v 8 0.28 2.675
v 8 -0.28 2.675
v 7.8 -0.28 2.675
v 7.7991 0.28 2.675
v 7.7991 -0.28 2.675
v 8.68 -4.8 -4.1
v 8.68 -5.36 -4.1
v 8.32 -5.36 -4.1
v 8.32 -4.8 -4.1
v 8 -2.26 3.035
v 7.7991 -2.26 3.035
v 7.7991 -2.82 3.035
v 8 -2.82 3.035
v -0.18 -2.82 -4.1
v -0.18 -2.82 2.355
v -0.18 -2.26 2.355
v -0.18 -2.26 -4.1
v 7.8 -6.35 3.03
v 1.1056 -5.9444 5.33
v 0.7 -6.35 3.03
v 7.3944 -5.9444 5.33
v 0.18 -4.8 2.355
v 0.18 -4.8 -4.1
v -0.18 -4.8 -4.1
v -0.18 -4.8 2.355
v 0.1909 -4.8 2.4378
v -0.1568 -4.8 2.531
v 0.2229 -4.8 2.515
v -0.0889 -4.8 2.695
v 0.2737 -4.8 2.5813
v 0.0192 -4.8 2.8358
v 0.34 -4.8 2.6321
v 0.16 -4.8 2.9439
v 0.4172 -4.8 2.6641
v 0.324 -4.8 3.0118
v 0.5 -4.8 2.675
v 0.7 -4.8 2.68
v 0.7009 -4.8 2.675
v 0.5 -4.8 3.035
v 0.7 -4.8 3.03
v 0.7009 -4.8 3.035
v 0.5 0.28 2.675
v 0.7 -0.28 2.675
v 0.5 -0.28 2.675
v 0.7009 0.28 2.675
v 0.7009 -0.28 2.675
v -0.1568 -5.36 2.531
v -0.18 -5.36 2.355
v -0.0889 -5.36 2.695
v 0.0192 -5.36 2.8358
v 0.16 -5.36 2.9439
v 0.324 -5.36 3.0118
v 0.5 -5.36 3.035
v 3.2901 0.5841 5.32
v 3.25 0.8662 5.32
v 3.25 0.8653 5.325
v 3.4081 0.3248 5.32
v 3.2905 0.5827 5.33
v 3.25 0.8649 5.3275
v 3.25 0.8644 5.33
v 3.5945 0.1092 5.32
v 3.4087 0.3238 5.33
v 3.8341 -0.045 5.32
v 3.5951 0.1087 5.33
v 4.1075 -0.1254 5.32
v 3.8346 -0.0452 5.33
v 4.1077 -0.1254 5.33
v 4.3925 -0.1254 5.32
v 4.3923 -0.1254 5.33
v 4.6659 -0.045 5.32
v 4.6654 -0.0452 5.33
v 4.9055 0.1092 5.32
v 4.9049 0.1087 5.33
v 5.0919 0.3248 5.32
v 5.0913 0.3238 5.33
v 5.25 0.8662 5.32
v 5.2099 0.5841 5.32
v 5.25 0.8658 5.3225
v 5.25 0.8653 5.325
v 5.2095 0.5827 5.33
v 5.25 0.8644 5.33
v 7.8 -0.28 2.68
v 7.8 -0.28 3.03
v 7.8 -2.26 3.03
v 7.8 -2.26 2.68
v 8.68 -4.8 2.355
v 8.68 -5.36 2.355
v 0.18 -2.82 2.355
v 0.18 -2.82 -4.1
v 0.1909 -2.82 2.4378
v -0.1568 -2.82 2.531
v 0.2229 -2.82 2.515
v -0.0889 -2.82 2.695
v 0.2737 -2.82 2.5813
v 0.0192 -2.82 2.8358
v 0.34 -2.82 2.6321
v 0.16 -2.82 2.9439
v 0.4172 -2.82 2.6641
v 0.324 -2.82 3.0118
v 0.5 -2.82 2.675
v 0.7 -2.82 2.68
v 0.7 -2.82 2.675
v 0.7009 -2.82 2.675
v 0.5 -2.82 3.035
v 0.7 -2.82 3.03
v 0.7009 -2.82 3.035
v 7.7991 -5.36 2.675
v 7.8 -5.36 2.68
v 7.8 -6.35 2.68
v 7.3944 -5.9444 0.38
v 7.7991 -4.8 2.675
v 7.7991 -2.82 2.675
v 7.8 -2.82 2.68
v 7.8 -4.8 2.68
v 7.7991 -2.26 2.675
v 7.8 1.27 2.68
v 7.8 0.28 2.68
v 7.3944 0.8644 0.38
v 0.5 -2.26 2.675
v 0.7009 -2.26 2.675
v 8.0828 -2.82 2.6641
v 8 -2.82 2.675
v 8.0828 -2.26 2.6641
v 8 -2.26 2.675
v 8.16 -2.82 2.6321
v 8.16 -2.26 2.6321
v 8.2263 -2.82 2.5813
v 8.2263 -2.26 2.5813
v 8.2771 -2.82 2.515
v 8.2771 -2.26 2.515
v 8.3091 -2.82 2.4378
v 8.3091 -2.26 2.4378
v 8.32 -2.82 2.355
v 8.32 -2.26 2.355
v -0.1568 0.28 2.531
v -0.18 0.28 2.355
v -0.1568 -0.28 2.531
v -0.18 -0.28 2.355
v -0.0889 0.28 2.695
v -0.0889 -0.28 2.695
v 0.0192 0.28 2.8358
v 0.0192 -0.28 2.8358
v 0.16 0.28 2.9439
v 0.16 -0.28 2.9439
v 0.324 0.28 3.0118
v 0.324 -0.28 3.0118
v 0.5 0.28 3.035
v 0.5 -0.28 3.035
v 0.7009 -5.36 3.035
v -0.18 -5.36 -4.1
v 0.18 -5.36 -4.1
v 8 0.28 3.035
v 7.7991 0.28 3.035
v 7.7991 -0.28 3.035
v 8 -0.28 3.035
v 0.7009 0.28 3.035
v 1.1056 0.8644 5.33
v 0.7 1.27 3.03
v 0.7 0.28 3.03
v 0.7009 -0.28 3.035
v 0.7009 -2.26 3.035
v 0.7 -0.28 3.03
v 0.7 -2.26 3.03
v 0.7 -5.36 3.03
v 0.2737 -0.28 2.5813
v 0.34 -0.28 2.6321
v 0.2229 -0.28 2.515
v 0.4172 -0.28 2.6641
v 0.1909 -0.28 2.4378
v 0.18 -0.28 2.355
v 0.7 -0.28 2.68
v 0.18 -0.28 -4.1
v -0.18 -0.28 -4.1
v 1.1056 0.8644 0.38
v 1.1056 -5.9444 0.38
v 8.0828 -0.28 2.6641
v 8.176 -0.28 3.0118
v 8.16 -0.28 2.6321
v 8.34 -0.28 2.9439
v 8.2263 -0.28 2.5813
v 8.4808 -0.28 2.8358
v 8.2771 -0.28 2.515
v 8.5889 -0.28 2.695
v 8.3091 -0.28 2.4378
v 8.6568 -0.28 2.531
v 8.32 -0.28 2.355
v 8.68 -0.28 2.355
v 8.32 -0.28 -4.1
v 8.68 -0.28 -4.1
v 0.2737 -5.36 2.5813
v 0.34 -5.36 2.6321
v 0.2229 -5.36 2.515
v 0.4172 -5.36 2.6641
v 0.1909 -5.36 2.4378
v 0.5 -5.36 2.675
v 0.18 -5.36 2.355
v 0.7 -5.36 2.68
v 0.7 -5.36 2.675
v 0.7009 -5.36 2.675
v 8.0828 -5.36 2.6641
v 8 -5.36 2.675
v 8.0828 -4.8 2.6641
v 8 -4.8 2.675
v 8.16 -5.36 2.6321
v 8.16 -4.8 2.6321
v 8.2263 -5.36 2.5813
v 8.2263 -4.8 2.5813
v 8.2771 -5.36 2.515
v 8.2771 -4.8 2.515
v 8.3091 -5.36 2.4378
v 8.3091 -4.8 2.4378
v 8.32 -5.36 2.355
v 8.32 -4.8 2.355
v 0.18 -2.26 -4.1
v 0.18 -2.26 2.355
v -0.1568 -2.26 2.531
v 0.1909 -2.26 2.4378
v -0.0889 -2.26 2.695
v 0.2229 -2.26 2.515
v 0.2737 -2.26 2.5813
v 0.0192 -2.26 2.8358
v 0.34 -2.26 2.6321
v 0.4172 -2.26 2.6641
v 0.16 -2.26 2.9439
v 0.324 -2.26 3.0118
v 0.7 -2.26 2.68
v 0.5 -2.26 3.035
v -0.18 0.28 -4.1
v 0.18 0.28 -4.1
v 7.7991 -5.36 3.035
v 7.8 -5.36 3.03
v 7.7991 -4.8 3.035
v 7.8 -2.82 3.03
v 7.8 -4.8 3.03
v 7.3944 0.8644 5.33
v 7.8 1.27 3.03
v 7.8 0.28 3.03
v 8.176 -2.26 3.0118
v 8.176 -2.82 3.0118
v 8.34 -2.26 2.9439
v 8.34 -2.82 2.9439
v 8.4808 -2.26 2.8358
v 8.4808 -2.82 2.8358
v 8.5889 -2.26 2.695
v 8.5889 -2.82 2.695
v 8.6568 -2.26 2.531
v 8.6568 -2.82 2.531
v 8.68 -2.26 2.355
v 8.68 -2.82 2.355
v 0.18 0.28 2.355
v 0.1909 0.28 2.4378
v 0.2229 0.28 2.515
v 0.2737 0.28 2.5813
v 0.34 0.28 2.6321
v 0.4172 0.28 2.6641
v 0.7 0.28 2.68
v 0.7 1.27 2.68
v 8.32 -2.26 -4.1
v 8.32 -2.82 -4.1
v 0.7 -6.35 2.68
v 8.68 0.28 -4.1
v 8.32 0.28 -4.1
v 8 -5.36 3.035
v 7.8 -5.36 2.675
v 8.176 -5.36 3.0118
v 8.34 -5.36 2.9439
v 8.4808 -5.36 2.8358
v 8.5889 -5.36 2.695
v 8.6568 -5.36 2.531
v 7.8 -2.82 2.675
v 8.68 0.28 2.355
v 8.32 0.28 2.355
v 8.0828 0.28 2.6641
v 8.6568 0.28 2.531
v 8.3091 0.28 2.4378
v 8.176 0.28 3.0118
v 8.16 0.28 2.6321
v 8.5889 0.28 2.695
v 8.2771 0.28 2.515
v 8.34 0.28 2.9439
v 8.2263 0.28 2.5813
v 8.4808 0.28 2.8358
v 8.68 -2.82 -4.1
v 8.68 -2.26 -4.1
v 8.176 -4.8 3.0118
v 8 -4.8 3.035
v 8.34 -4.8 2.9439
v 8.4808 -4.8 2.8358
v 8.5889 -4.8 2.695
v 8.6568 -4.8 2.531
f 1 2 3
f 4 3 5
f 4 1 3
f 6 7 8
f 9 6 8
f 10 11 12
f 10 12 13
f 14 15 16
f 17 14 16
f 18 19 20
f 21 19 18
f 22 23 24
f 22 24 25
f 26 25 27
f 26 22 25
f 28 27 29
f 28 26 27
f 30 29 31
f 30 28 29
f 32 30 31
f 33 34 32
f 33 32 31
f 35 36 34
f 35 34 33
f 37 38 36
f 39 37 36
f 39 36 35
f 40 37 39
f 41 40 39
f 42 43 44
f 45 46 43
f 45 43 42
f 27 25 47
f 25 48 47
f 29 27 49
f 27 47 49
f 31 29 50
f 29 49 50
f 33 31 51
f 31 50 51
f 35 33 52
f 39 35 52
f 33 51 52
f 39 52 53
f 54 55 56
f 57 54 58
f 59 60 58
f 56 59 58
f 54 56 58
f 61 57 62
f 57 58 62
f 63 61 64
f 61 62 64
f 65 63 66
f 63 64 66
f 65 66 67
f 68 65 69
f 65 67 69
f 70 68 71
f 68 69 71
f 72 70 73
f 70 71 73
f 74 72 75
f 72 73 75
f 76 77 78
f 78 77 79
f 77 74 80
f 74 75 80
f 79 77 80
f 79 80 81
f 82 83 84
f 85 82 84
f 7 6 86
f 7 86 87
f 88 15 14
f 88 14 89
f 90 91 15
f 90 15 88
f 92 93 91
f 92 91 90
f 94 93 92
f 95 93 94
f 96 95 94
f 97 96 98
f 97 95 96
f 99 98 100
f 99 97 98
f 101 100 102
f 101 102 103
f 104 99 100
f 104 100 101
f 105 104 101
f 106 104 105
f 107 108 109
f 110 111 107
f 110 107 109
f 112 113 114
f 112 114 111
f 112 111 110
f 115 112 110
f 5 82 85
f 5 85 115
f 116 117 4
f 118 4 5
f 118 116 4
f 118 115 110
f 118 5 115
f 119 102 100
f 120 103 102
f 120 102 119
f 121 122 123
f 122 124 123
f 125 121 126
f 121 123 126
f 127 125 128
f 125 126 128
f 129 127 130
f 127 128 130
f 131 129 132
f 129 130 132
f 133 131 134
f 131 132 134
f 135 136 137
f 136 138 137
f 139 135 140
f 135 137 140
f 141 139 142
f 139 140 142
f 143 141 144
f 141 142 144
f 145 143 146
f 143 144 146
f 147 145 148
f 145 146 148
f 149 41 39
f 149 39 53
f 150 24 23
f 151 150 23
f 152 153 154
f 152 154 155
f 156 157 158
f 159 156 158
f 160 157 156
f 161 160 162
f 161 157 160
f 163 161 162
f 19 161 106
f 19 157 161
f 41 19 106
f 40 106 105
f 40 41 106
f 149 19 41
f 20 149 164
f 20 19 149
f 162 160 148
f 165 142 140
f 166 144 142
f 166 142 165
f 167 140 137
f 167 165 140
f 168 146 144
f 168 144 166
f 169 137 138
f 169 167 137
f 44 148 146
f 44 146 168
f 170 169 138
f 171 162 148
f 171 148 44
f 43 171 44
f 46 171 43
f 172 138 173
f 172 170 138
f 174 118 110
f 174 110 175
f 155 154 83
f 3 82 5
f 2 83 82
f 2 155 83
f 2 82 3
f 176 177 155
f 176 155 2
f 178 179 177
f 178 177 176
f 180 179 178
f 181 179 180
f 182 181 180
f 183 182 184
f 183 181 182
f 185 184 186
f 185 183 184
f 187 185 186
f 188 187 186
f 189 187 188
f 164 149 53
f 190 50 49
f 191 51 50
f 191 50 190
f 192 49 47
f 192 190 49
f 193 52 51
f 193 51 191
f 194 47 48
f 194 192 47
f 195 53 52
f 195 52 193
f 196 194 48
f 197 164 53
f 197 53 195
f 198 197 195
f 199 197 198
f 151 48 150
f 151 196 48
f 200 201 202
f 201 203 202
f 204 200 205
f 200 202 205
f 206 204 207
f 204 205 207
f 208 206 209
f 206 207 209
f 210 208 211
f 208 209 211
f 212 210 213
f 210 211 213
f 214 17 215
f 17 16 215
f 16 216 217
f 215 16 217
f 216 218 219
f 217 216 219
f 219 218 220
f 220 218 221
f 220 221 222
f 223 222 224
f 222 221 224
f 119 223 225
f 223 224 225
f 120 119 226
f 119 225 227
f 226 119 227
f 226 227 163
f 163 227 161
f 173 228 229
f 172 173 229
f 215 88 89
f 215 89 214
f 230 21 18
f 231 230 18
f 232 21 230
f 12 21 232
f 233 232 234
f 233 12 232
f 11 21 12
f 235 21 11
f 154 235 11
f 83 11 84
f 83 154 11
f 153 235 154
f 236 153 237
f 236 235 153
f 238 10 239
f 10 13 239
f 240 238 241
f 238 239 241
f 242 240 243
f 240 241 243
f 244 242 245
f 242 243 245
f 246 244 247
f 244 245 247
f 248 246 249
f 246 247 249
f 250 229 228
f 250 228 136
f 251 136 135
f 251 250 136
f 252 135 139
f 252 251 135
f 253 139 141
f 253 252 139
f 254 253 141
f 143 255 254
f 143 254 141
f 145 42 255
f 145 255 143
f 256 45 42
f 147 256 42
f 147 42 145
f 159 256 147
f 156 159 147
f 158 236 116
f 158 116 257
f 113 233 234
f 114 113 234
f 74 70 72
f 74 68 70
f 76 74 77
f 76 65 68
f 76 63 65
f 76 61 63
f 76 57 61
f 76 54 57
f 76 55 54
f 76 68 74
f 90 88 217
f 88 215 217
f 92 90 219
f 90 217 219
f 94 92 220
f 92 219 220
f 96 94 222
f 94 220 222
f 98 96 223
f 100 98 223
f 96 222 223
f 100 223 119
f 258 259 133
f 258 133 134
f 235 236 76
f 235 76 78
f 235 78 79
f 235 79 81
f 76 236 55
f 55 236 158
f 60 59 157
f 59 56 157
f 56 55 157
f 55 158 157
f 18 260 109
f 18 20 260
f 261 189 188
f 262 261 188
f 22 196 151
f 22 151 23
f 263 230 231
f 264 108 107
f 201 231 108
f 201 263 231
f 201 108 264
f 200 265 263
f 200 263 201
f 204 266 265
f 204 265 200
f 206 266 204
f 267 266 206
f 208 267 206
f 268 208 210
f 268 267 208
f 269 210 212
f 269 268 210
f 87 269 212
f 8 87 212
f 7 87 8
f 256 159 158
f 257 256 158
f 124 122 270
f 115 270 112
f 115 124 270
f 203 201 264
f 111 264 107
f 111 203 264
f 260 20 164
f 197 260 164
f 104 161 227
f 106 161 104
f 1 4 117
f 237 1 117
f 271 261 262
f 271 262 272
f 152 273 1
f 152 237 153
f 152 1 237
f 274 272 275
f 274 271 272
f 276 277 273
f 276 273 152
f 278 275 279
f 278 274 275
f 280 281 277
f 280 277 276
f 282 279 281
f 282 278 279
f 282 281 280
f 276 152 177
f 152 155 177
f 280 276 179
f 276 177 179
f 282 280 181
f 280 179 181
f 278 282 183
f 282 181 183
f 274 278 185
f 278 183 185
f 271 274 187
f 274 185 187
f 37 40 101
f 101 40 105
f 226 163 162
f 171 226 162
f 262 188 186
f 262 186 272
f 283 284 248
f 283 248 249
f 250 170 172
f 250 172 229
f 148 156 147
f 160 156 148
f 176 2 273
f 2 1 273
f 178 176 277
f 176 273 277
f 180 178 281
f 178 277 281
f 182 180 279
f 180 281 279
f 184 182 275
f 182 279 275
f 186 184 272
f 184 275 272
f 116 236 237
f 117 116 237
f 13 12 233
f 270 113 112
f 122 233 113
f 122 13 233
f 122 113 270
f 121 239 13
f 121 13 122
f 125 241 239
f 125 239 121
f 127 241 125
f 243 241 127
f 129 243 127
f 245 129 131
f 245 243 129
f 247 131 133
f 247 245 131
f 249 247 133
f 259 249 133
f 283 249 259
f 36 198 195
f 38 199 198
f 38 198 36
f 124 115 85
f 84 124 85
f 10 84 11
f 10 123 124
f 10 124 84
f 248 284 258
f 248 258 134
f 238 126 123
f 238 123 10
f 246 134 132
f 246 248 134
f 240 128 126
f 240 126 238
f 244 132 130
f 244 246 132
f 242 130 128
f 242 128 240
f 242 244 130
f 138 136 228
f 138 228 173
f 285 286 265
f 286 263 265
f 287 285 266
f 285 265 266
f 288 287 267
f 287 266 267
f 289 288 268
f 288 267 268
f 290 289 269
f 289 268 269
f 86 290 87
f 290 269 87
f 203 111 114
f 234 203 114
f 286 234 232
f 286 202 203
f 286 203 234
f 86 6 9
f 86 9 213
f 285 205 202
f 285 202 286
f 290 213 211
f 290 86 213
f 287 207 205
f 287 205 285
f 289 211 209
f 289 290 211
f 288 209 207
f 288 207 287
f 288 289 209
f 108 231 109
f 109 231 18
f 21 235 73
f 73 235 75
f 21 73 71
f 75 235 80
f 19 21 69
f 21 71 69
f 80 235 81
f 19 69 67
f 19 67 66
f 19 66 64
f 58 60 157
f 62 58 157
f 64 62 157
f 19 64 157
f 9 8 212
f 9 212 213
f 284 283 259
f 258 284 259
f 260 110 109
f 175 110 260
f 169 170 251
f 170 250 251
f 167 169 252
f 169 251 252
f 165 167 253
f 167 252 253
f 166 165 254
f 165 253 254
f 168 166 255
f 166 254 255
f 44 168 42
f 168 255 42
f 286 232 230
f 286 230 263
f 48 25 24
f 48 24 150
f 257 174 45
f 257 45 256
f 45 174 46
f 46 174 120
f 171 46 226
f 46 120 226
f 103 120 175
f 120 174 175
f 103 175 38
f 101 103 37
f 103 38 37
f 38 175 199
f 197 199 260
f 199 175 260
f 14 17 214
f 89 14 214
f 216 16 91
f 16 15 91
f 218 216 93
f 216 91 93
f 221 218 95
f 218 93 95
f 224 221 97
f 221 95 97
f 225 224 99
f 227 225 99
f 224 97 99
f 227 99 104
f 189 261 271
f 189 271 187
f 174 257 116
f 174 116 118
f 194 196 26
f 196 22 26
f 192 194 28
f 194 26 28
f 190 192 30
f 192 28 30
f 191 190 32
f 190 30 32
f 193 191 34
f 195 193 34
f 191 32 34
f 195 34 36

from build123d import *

# Parameters (mm, degrees)
EXTRUDE_1_DEPTH     = 4.95
SKETCH_5_W          = 0.36
SKETCH_5_H          = 0.56
SKETCH_5_2_W        = 0.36
SKETCH_5_2_H        = 0.56
EXTRUDE_2_DEPTH     = 4.1
CHAMFER_1_SIZE      = 2.3
CHAMFER_1_SIZE_2    = 0.405552056
SKETCH_6_R          = 1
CUT_EXTRUDE_1_DEPTH = 0.01
SKETCH_7_W          = 10.556189846
SKETCH_7_H          = 3.652287582
CUT_EXTRUDE_2_DEPTH = 20
CHAMFER_2_SIZE      = 2.3
CHAMFER_2_SIZE2     = 0.405552056


with BuildPart() as part:
    # Эскиз3 → Вытянуть1 (new body)
    with BuildSketch(Plane.XY.offset(5.33)):
        Polygon((0.7, 1.27), (4.25, 1.27), (7.8, 1.27), (7.8, -8.89), (0.7, -8.89), align=None)
    extrude(amount=-EXTRUDE_1_DEPTH)

    # По траектории1: sweep along a path in Эскиз4
    with BuildLine(Plane(origin=(0, 0, 0), x_dir=(1, 0, 0), z_dir=(0, 1, 0))) as sweep_1_path:
        Line((0, 0), (0, -2.355))
        ThreePointArc((0, -2.355), (0.146446609, -2.708553391), (0.5, -2.855))
        Line((0.5, -2.855), (0.7, -2.855))
        Line((0.7, -2.855), (7.8, -2.855))
        Line((7.8, -2.855), (8, -2.855))
        ThreePointArc((8, -2.855), (8.353553391, -2.708553391), (8.5, -2.355))
        Line((8.5, -2.355), (8.5, 0))
        Line((8.5, 0), (8.5, 4.1))
    # Эскиз5 → По траектории1 (sweep)
    with BuildSketch(Plane.XY):
        with Locations((0, -2.54)):
            Rectangle(SKETCH_5_W, SKETCH_5_H)
        Rectangle(SKETCH_5_W, SKETCH_5_H)
        with Locations((0, -5.08)):
            Rectangle(SKETCH_5_W, SKETCH_5_H)
        with Locations((0, -7.62)):
            Rectangle(SKETCH_5_W, SKETCH_5_H)
    sweep(path=sweep_1_path.line)

    # Эскиз5<2> → Вытянуть2 (add)
    with BuildSketch(Plane.XY):
        with Locations((0, -2.54)):
            Rectangle(SKETCH_5_2_W, SKETCH_5_2_H)
        Rectangle(SKETCH_5_2_W, SKETCH_5_2_H)
        with Locations((0, -5.08)):
            Rectangle(SKETCH_5_2_W, SKETCH_5_2_H)
        with Locations((0, -7.62)):
            Rectangle(SKETCH_5_2_W, SKETCH_5_2_H)
    extrude(amount=-EXTRUDE_2_DEPTH)

    # Фаска1
    # the kernel refuses this chamfer: 2.3, 0.405552056 mm, written as the material it takes off along each edge
    with BuildSketch(Plane(origin=(13.776639232, -8.89, 0.38), x_dir=(0, -0.006682531656101655, 0.9999776716360548), z_dir=(-1, 0, 0))) as chamfer_1_piece_1:
        Polygon((CHAMFER_1_SIZE * 0.999977671636, CHAMFER_1_SIZE * 0.0066825316561), (-CHAMFER_1_SIZE_2 * 0.00668253165, CHAMFER_1_SIZE_2 * 0.999977670722), (0, 0), align=None)
    extrude(amount=19.053278464, mode=Mode.SUBTRACT)
    with BuildSketch(Plane(origin=(13.776639232, -8.89, 5.33), x_dir=(4.402885138150507e-15, 0.9776715712462588, 0.2101387607674306), z_dir=(-1, 0, 0))) as chamfer_1_piece_2:
        Polygon((CHAMFER_1_SIZE_2 * 0.977671570353, CHAMFER_1_SIZE_2 * 0.210138760575), (-CHAMFER_1_SIZE * 0.210138760767, CHAMFER_1_SIZE * 0.977671571246), (0, 0), align=None)
    extrude(amount=19.053278464, mode=Mode.SUBTRACT)
    with BuildSketch(Plane(origin=(7.8, 7.246639232, 0.38), x_dir=(0.006682531656101655, 0, 0.9999776716360548), z_dir=(0, -1, 0))) as chamfer_1_piece_3_section:
        Polygon((CHAMFER_1_SIZE * 0.999977671636, CHAMFER_1_SIZE * 0.0066825316561), (-CHAMFER_1_SIZE_2 * 0.00668253165, CHAMFER_1_SIZE_2 * 0.999977670722), (0, 0), align=None)
    chamfer_1_piece_3 = extrude(amount=22.113278464, mode=Mode.PRIVATE)
    chamfer_1_piece_3 = split(chamfer_1_piece_3, bisect_by=Plane(origin=(7.799706122, 0.28, 2.676666667), z_dir=(0, 1, 0)), keep=Keep.TOP, mode=Mode.PRIVATE)
    add(chamfer_1_piece_3, mode=Mode.SUBTRACT)
    with BuildSketch(Plane(origin=(7.8, 7.246639232, 0.38), x_dir=(0.006682531656101655, 0, 0.9999776716360548), z_dir=(0, -1, 0))) as chamfer_1_piece_4_section:
        Polygon((CHAMFER_1_SIZE * 0.999977671636, CHAMFER_1_SIZE * 0.0066825316561), (-CHAMFER_1_SIZE_2 * 0.00668253165, CHAMFER_1_SIZE_2 * 0.999977670722), (0, 0), align=None)
    chamfer_1_piece_4 = extrude(amount=22.113278464, mode=Mode.PRIVATE)
    chamfer_1_piece_4 = split(chamfer_1_piece_4, bisect_by=Plane(origin=(7.664815344, 0, 2.675), z_dir=(0, 0, -1)), keep=Keep.TOP, mode=Mode.PRIVATE)
    add(chamfer_1_piece_4, mode=Mode.SUBTRACT)
    with BuildSketch(Plane(origin=(7.8, 7.246639232, 0.38), x_dir=(0.006682531656101655, 0, 0.9999776716360548), z_dir=(0, -1, 0))) as chamfer_1_piece_5_section:
        Polygon((CHAMFER_1_SIZE * 0.999977671636, CHAMFER_1_SIZE * 0.0066825316561), (-CHAMFER_1_SIZE_2 * 0.00668253165, CHAMFER_1_SIZE_2 * 0.999977670722), (0, 0), align=None)
    chamfer_1_piece_5 = extrude(amount=22.113278464, mode=Mode.PRIVATE)
    chamfer_1_piece_5 = split(chamfer_1_piece_5, bisect_by=Plane(origin=(7.799706122, -2.26, 2.676666667), z_dir=(0, 1, 0)), keep=Keep.TOP, mode=Mode.PRIVATE)
    chamfer_1_piece_5 = split(chamfer_1_piece_5, bisect_by=Plane(origin=(7.799706122, -0.28, 2.676666667), z_dir=(0, -1, 0)), keep=Keep.TOP, mode=Mode.PRIVATE)
    add(chamfer_1_piece_5, mode=Mode.SUBTRACT)
    with BuildSketch(Plane(origin=(7.8, 7.246639232, 0.38), x_dir=(0.006682531656101655, 0, 0.9999776716360548), z_dir=(0, -1, 0))) as chamfer_1_piece_6_section:
        Polygon((CHAMFER_1_SIZE * 0.999977671636, CHAMFER_1_SIZE * 0.0066825316561), (-CHAMFER_1_SIZE_2 * 0.00668253165, CHAMFER_1_SIZE_2 * 0.999977670722), (0, 0), align=None)
    chamfer_1_piece_6 = extrude(amount=22.113278464, mode=Mode.PRIVATE)
    chamfer_1_piece_6 = split(chamfer_1_piece_6, bisect_by=Plane(origin=(7.799706122, -2.82, 2.676666667), z_dir=(0, -1, 0)), keep=Keep.TOP, mode=Mode.PRIVATE)
    chamfer_1_piece_6 = split(chamfer_1_piece_6, bisect_by=Plane(origin=(7.799706122, -4.8, 2.676666667), z_dir=(0, 1, 0)), keep=Keep.TOP, mode=Mode.PRIVATE)
    add(chamfer_1_piece_6, mode=Mode.SUBTRACT)
    with BuildSketch(Plane(origin=(7.8, 7.246639232, 0.38), x_dir=(0.006682531656101655, 0, 0.9999776716360548), z_dir=(0, -1, 0))) as chamfer_1_piece_7_section:
        Polygon((CHAMFER_1_SIZE * 0.999977671636, CHAMFER_1_SIZE * 0.0066825316561), (-CHAMFER_1_SIZE_2 * 0.00668253165, CHAMFER_1_SIZE_2 * 0.999977670722), (0, 0), align=None)
    chamfer_1_piece_7 = extrude(amount=22.113278464, mode=Mode.PRIVATE)
    chamfer_1_piece_7 = split(chamfer_1_piece_7, bisect_by=Plane(origin=(7.799706122, -7.34, 2.676666667), z_dir=(0, 1, 0)), keep=Keep.TOP, mode=Mode.PRIVATE)
    chamfer_1_piece_7 = split(chamfer_1_piece_7, bisect_by=Plane(origin=(7.799706122, -5.36, 2.676666667), z_dir=(0, -1, 0)), keep=Keep.TOP, mode=Mode.PRIVATE)
    add(chamfer_1_piece_7, mode=Mode.SUBTRACT)
    with BuildSketch(Plane(origin=(7.8, 7.246639232, 0.38), x_dir=(0.006682531656101655, 0, 0.9999776716360548), z_dir=(0, -1, 0))) as chamfer_1_piece_8_section:
        Polygon((CHAMFER_1_SIZE * 0.999977671636, CHAMFER_1_SIZE * 0.0066825316561), (-CHAMFER_1_SIZE_2 * 0.00668253165, CHAMFER_1_SIZE_2 * 0.999977670722), (0, 0), align=None)
    chamfer_1_piece_8 = extrude(amount=22.113278464, mode=Mode.PRIVATE)
    chamfer_1_piece_8 = split(chamfer_1_piece_8, bisect_by=Plane(origin=(7.799706122, -7.9, 2.676666667), z_dir=(0, -1, 0)), keep=Keep.TOP, mode=Mode.PRIVATE)
    add(chamfer_1_piece_8, mode=Mode.SUBTRACT)
    with BuildSketch(Plane(origin=(7.8, 7.246639232, 5.33), x_dir=(-0.9776715712462587, -1.3674752616302956e-15, 0.21013876076743102), z_dir=(0, -1, 0))) as chamfer_1_piece_9_section:
        Polygon((CHAMFER_1_SIZE_2 * 0.977671570353, CHAMFER_1_SIZE_2 * 0.210138760575), (-CHAMFER_1_SIZE * 0.210138760767, CHAMFER_1_SIZE * 0.977671571246), (0, 0), align=None)
    chamfer_1_piece_9 = extrude(amount=22.113278464, mode=Mode.PRIVATE)
    chamfer_1_piece_9 = split(chamfer_1_piece_9, bisect_by=Plane(origin=(7.664815344, 0.775, 3.035), z_dir=(0, 0, 1)), keep=Keep.TOP, mode=Mode.PRIVATE)
    add(chamfer_1_piece_9, mode=Mode.SUBTRACT)
    with BuildSketch(Plane(origin=(7.8, 7.246639232, 5.33), x_dir=(-0.9776715712462587, -1.3674752616302956e-15, 0.21013876076743102), z_dir=(0, -1, 0))) as chamfer_1_piece_10_section:
        Polygon((CHAMFER_1_SIZE_2 * 0.977671570353, CHAMFER_1_SIZE_2 * 0.210138760575), (-CHAMFER_1_SIZE * 0.210138760767, CHAMFER_1_SIZE * 0.977671571246), (0, 0), align=None)
    chamfer_1_piece_10 = extrude(amount=22.113278464, mode=Mode.PRIVATE)
    chamfer_1_piece_10 = split(chamfer_1_piece_10, bisect_by=Plane(origin=(7.799706122, 0.28, 3.033333333), z_dir=(0, 1, 0)), keep=Keep.TOP, mode=Mode.PRIVATE)
    add(chamfer_1_piece_10, mode=Mode.SUBTRACT)
    with BuildSketch(Plane(origin=(7.8, 7.246639232, 5.33), x_dir=(-0.9776715712462587, -1.3674752616302956e-15, 0.21013876076743102), z_dir=(0, -1, 0))) as chamfer_1_piece_11_section:
        Polygon((CHAMFER_1_SIZE_2 * 0.977671570353, CHAMFER_1_SIZE_2 * 0.210138760575), (-CHAMFER_1_SIZE * 0.210138760767, CHAMFER_1_SIZE * 0.977671571246), (0, 0), align=None)
    chamfer_1_piece_11 = extrude(amount=22.113278464, mode=Mode.PRIVATE)
    chamfer_1_piece_11 = split(chamfer_1_piece_11, bisect_by=Plane(origin=(7.799706122, -2.26, 3.033333333), z_dir=(0, 1, 0)), keep=Keep.TOP, mode=Mode.PRIVATE)
    chamfer_1_piece_11 = split(chamfer_1_piece_11, bisect_by=Plane(origin=(7.799706122, -0.28, 3.033333333), z_dir=(0, -1, 0)), keep=Keep.TOP, mode=Mode.PRIVATE)
    add(chamfer_1_piece_11, mode=Mode.SUBTRACT)
    with BuildSketch(Plane(origin=(7.8, 7.246639232, 5.33), x_dir=(-0.9776715712462587, -1.3674752616302956e-15, 0.21013876076743102), z_dir=(0, -1, 0))) as chamfer_1_piece_12_section:
        Polygon((CHAMFER_1_SIZE_2 * 0.977671570353, CHAMFER_1_SIZE_2 * 0.210138760575), (-CHAMFER_1_SIZE * 0.210138760767, CHAMFER_1_SIZE * 0.977671571246), (0, 0), align=None)
    chamfer_1_piece_12 = extrude(amount=22.113278464, mode=Mode.PRIVATE)
    chamfer_1_piece_12 = split(chamfer_1_piece_12, bisect_by=Plane(origin=(7.799706122, -2.82, 3.033333333), z_dir=(0, -1, 0)), keep=Keep.TOP, mode=Mode.PRIVATE)
    chamfer_1_piece_12 = split(chamfer_1_piece_12, bisect_by=Plane(origin=(7.799706122, -4.8, 3.033333333), z_dir=(0, 1, 0)), keep=Keep.TOP, mode=Mode.PRIVATE)
    add(chamfer_1_piece_12, mode=Mode.SUBTRACT)
    with BuildSketch(Plane(origin=(7.8, 7.246639232, 5.33), x_dir=(-0.9776715712462587, -1.3674752616302956e-15, 0.21013876076743102), z_dir=(0, -1, 0))) as chamfer_1_piece_13_section:
        Polygon((CHAMFER_1_SIZE_2 * 0.977671570353, CHAMFER_1_SIZE_2 * 0.210138760575), (-CHAMFER_1_SIZE * 0.210138760767, CHAMFER_1_SIZE * 0.977671571246), (0, 0), align=None)
    chamfer_1_piece_13 = extrude(amount=22.113278464, mode=Mode.PRIVATE)
    chamfer_1_piece_13 = split(chamfer_1_piece_13, bisect_by=Plane(origin=(7.799706122, -7.34, 3.033333333), z_dir=(0, 1, 0)), keep=Keep.TOP, mode=Mode.PRIVATE)
    chamfer_1_piece_13 = split(chamfer_1_piece_13, bisect_by=Plane(origin=(7.799706122, -5.36, 3.033333333), z_dir=(0, -1, 0)), keep=Keep.TOP, mode=Mode.PRIVATE)
    add(chamfer_1_piece_13, mode=Mode.SUBTRACT)
    with BuildSketch(Plane(origin=(7.8, 7.246639232, 5.33), x_dir=(-0.9776715712462587, -1.3674752616302956e-15, 0.21013876076743102), z_dir=(0, -1, 0))) as chamfer_1_piece_14_section:
        Polygon((CHAMFER_1_SIZE_2 * 0.977671570353, CHAMFER_1_SIZE_2 * 0.210138760575), (-CHAMFER_1_SIZE * 0.210138760767, CHAMFER_1_SIZE * 0.977671571246), (0, 0), align=None)
    chamfer_1_piece_14 = extrude(amount=22.113278464, mode=Mode.PRIVATE)
    chamfer_1_piece_14 = split(chamfer_1_piece_14, bisect_by=Plane(origin=(7.799706122, -7.9, 3.033333333), z_dir=(0, -1, 0)), keep=Keep.TOP, mode=Mode.PRIVATE)
    add(chamfer_1_piece_14, mode=Mode.SUBTRACT)
    with BuildSketch(Plane(origin=(13.776639232, 1.27, 0.38), x_dir=(0, 0.006682531656101748, 0.9999776716360548), z_dir=(-1, 0, 0)), Plane(origin=(-5.276639232, 1.27, 5.33), x_dir=(0, 0.006682531656101748, -0.9999776716360548), z_dir=(1, 0, 0))) as chamfer_1_piece_15:
        Polygon((CHAMFER_1_SIZE * 0.999977671636, -CHAMFER_1_SIZE * 0.0066825316561), (-CHAMFER_1_SIZE_2 * 0.00668253165, -CHAMFER_1_SIZE_2 * 0.999977670722), (0, 0), align=None)
    extrude(amount=19.053278464, mode=Mode.SUBTRACT)
    with BuildSketch(Plane(origin=(0.7, -14.866639232, 0.38), x_dir=(0.9776715712462587, 0, -0.2101387607674313), z_dir=(0, 1, 0))) as chamfer_1_piece_16_section:
        Polygon((CHAMFER_1_SIZE_2 * 0.977671570353, -CHAMFER_1_SIZE_2 * 0.210138760575), (-CHAMFER_1_SIZE * 0.210138760767, -CHAMFER_1_SIZE * 0.977671571246), (0, 0), align=None)
    chamfer_1_piece_16 = extrude(amount=22.113278464, mode=Mode.PRIVATE)
    chamfer_1_piece_16 = split(chamfer_1_piece_16, bisect_by=Plane(origin=(0.835184656, -8.395, 2.675), z_dir=(0, 0, -1)), keep=Keep.TOP, mode=Mode.PRIVATE)
    add(chamfer_1_piece_16, mode=Mode.SUBTRACT)
    with BuildSketch(Plane(origin=(0.7, -14.866639232, 0.38), x_dir=(0.9776715712462587, 0, -0.2101387607674313), z_dir=(0, 1, 0))) as chamfer_1_piece_17_section:
        Polygon((CHAMFER_1_SIZE_2 * 0.977671570353, -CHAMFER_1_SIZE_2 * 0.210138760575), (-CHAMFER_1_SIZE * 0.210138760767, -CHAMFER_1_SIZE * 0.977671571246), (0, 0), align=None)
    chamfer_1_piece_17 = extrude(amount=22.113278464, mode=Mode.PRIVATE)
    chamfer_1_piece_17 = split(chamfer_1_piece_17, bisect_by=Plane(origin=(0.700293878, -7.9, 2.676666667), z_dir=(0, -1, 0)), keep=Keep.TOP, mode=Mode.PRIVATE)
    add(chamfer_1_piece_17, mode=Mode.SUBTRACT)
    with BuildSketch(Plane(origin=(0.7, -14.866639232, 0.38), x_dir=(0.9776715712462587, 0, -0.2101387607674313), z_dir=(0, 1, 0))) as chamfer_1_piece_18_section:
        Polygon((CHAMFER_1_SIZE_2 * 0.977671570353, -CHAMFER_1_SIZE_2 * 0.210138760575), (-CHAMFER_1_SIZE * 0.210138760767, -CHAMFER_1_SIZE * 0.977671571246), (0, 0), align=None)
    chamfer_1_piece_18 = extrude(amount=22.113278464, mode=Mode.PRIVATE)
    chamfer_1_piece_18 = split(chamfer_1_piece_18, bisect_by=Plane(origin=(0.700293878, -5.36, 2.676666667), z_dir=(0, -1, 0)), keep=Keep.TOP, mode=Mode.PRIVATE)
    chamfer_1_piece_18 = split(chamfer_1_piece_18, bisect_by=Plane(origin=(0.700293878, -7.34, 2.676666667), z_dir=(0, 1, 0)), keep=Keep.TOP, mode=Mode.PRIVATE)
    add(chamfer_1_piece_18, mode=Mode.SUBTRACT)
    with BuildSketch(Plane(origin=(0.7, -14.866639232, 0.38), x_dir=(0.9776715712462587, 0, -0.2101387607674313), z_dir=(0, 1, 0))) as chamfer_1_piece_19_section:
        Polygon((CHAMFER_1_SIZE_2 * 0.977671570353, -CHAMFER_1_SIZE_2 * 0.210138760575), (-CHAMFER_1_SIZE * 0.210138760767, -CHAMFER_1_SIZE * 0.977671571246), (0, 0), align=None)
    chamfer_1_piece_19 = extrude(amount=22.113278464, mode=Mode.PRIVATE)
    chamfer_1_piece_19 = split(chamfer_1_piece_19, bisect_by=Plane(origin=(0.700293878, -2.82, 2.676666667), z_dir=(0, -1, 0)), keep=Keep.TOP, mode=Mode.PRIVATE)
    chamfer_1_piece_19 = split(chamfer_1_piece_19, bisect_by=Plane(origin=(0.700293878, -4.8, 2.676666667), z_dir=(0, 1, 0)), keep=Keep.TOP, mode=Mode.PRIVATE)
    add(chamfer_1_piece_19, mode=Mode.SUBTRACT)
    with BuildSketch(Plane(origin=(0.7, -14.866639232, 0.38), x_dir=(0.9776715712462587, 0, -0.2101387607674313), z_dir=(0, 1, 0))) as chamfer_1_piece_20_section:
        Polygon((CHAMFER_1_SIZE_2 * 0.977671570353, -CHAMFER_1_SIZE_2 * 0.210138760575), (-CHAMFER_1_SIZE * 0.210138760767, -CHAMFER_1_SIZE * 0.977671571246), (0, 0), align=None)
    chamfer_1_piece_20 = extrude(amount=22.113278464, mode=Mode.PRIVATE)
    chamfer_1_piece_20 = split(chamfer_1_piece_20, bisect_by=Plane(origin=(0.700293878, -0.28, 2.676666667), z_dir=(0, -1, 0)), keep=Keep.TOP, mode=Mode.PRIVATE)
    chamfer_1_piece_20 = split(chamfer_1_piece_20, bisect_by=Plane(origin=(0.700293878, -2.26, 2.676666667), z_dir=(0, 1, 0)), keep=Keep.TOP, mode=Mode.PRIVATE)
    add(chamfer_1_piece_20, mode=Mode.SUBTRACT)
    with BuildSketch(Plane(origin=(0.7, -14.866639232, 0.38), x_dir=(0.9776715712462587, 0, -0.2101387607674313), z_dir=(0, 1, 0))) as chamfer_1_piece_21_section:
        Polygon((CHAMFER_1_SIZE_2 * 0.977671570353, -CHAMFER_1_SIZE_2 * 0.210138760575), (-CHAMFER_1_SIZE * 0.210138760767, -CHAMFER_1_SIZE * 0.977671571246), (0, 0), align=None)
    chamfer_1_piece_21 = extrude(amount=22.113278464, mode=Mode.PRIVATE)
    chamfer_1_piece_21 = split(chamfer_1_piece_21, bisect_by=Plane(origin=(0.700293878, 0.28, 2.676666667), z_dir=(0, 1, 0)), keep=Keep.TOP, mode=Mode.PRIVATE)
    add(chamfer_1_piece_21, mode=Mode.SUBTRACT)
    with BuildSketch(Plane(origin=(0.7, -14.866639232, 5.33), x_dir=(0.9776715712462587, 0, 0.2101387607674309), z_dir=(0, 1, 0))) as chamfer_1_piece_22_section:
        Polygon((CHAMFER_1_SIZE_2 * 0.977671570353, CHAMFER_1_SIZE_2 * 0.210138760575), (-CHAMFER_1_SIZE * 0.210138760767, CHAMFER_1_SIZE * 0.977671571246), (0, 0), align=None)
    chamfer_1_piece_22 = extrude(amount=22.113278464, mode=Mode.PRIVATE)
    chamfer_1_piece_22 = split(chamfer_1_piece_22, bisect_by=Plane(origin=(0.835184656, -8.395, 3.035), z_dir=(0, 0, 1)), keep=Keep.TOP, mode=Mode.PRIVATE)
    add(chamfer_1_piece_22, mode=Mode.SUBTRACT)
    with BuildSketch(Plane(origin=(0.7, -14.866639232, 5.33), x_dir=(0.9776715712462587, 0, 0.2101387607674309), z_dir=(0, 1, 0))) as chamfer_1_piece_23_section:
        Polygon((CHAMFER_1_SIZE_2 * 0.977671570353, CHAMFER_1_SIZE_2 * 0.210138760575), (-CHAMFER_1_SIZE * 0.210138760767, CHAMFER_1_SIZE * 0.977671571246), (0, 0), align=None)
    chamfer_1_piece_23 = extrude(amount=22.113278464, mode=Mode.PRIVATE)
    chamfer_1_piece_23 = split(chamfer_1_piece_23, bisect_by=Plane(origin=(0.700293878, -7.9, 3.033333333), z_dir=(0, -1, 0)), keep=Keep.TOP, mode=Mode.PRIVATE)
    add(chamfer_1_piece_23, mode=Mode.SUBTRACT)
    with BuildSketch(Plane(origin=(0.7, -14.866639232, 5.33), x_dir=(0.9776715712462587, 0, 0.2101387607674309), z_dir=(0, 1, 0))) as chamfer_1_piece_24_section:
        Polygon((CHAMFER_1_SIZE_2 * 0.977671570353, CHAMFER_1_SIZE_2 * 0.210138760575), (-CHAMFER_1_SIZE * 0.210138760767, CHAMFER_1_SIZE * 0.977671571246), (0, 0), align=None)
    chamfer_1_piece_24 = extrude(amount=22.113278464, mode=Mode.PRIVATE)
    chamfer_1_piece_24 = split(chamfer_1_piece_24, bisect_by=Plane(origin=(0.700293878, -5.36, 3.033333333), z_dir=(0, -1, 0)), keep=Keep.TOP, mode=Mode.PRIVATE)
    chamfer_1_piece_24 = split(chamfer_1_piece_24, bisect_by=Plane(origin=(0.700293878, -7.34, 3.033333333), z_dir=(0, 1, 0)), keep=Keep.TOP, mode=Mode.PRIVATE)
    add(chamfer_1_piece_24, mode=Mode.SUBTRACT)
    with BuildSketch(Plane(origin=(0.7, -14.866639232, 5.33), x_dir=(0.9776715712462587, 0, 0.2101387607674309), z_dir=(0, 1, 0))) as chamfer_1_piece_25_section:
        Polygon((CHAMFER_1_SIZE_2 * 0.977671570353, CHAMFER_1_SIZE_2 * 0.210138760575), (-CHAMFER_1_SIZE * 0.210138760767, CHAMFER_1_SIZE * 0.977671571246), (0, 0), align=None)
    chamfer_1_piece_25 = extrude(amount=22.113278464, mode=Mode.PRIVATE)
    chamfer_1_piece_25 = split(chamfer_1_piece_25, bisect_by=Plane(origin=(0.700293878, -2.82, 3.033333333), z_dir=(0, -1, 0)), keep=Keep.TOP, mode=Mode.PRIVATE)
    chamfer_1_piece_25 = split(chamfer_1_piece_25, bisect_by=Plane(origin=(0.700293878, -4.8, 3.033333333), z_dir=(0, 1, 0)), keep=Keep.TOP, mode=Mode.PRIVATE)
    add(chamfer_1_piece_25, mode=Mode.SUBTRACT)
    with BuildSketch(Plane(origin=(0.7, -14.866639232, 5.33), x_dir=(0.9776715712462587, 0, 0.2101387607674309), z_dir=(0, 1, 0))) as chamfer_1_piece_26_section:
        Polygon((CHAMFER_1_SIZE_2 * 0.977671570353, CHAMFER_1_SIZE_2 * 0.210138760575), (-CHAMFER_1_SIZE * 0.210138760767, CHAMFER_1_SIZE * 0.977671571246), (0, 0), align=None)
    chamfer_1_piece_26 = extrude(amount=22.113278464, mode=Mode.PRIVATE)
    chamfer_1_piece_26 = split(chamfer_1_piece_26, bisect_by=Plane(origin=(0.700293878, -0.28, 3.033333333), z_dir=(0, -1, 0)), keep=Keep.TOP, mode=Mode.PRIVATE)
    chamfer_1_piece_26 = split(chamfer_1_piece_26, bisect_by=Plane(origin=(0.700293878, -2.26, 3.033333333), z_dir=(0, 1, 0)), keep=Keep.TOP, mode=Mode.PRIVATE)
    add(chamfer_1_piece_26, mode=Mode.SUBTRACT)
    with BuildSketch(Plane(origin=(0.7, -14.866639232, 5.33), x_dir=(0.9776715712462587, 0, 0.2101387607674309), z_dir=(0, 1, 0))) as chamfer_1_piece_27_section:
        Polygon((CHAMFER_1_SIZE_2 * 0.977671570353, CHAMFER_1_SIZE_2 * 0.210138760575), (-CHAMFER_1_SIZE * 0.210138760767, CHAMFER_1_SIZE * 0.977671571246), (0, 0), align=None)
    chamfer_1_piece_27 = extrude(amount=22.113278464, mode=Mode.PRIVATE)
    chamfer_1_piece_27 = split(chamfer_1_piece_27, bisect_by=Plane(origin=(0.700293878, 0.28, 3.033333333), z_dir=(0, 1, 0)), keep=Keep.TOP, mode=Mode.PRIVATE)
    add(chamfer_1_piece_27, mode=Mode.SUBTRACT)

    # Эскиз6 → Вырез-Вытянуть1 (cut)
    with BuildSketch(Plane.XY.offset(5.33)):
        with Locations((4.25, 0.864447944)):
            Circle(SKETCH_6_R)
    extrude(amount=-CUT_EXTRUDE_1_DEPTH, mode=Mode.SUBTRACT)

    # Эскиз7 → Вырез-Вытянуть2 (cut)
    with BuildSketch(Plane.XY.offset(5.33)):
        with Locations((4.103600287, -8.176143791)):
            Rectangle(SKETCH_7_W, SKETCH_7_H)
    extrude(amount=-CUT_EXTRUDE_2_DEPTH, mode=Mode.SUBTRACT)

    # Фаска2
    chamfer_2_edges = [part.edges().sort_by_distance(p)[0] for p in [
        (4.25, -6.35, 0.38),
        (4.25, -6.35, 5.33),
    ]]
    chamfer_2_side = [part.faces().sort_by_distance(p)[0] for p in [
        (4.25, -6.35, 2.855),
    ]]
    chamfer(chamfer_2_edges, length=CHAMFER_2_SIZE, length2=CHAMFER_2_SIZE2, reference=chamfer_2_side[0])


solid = part.part
